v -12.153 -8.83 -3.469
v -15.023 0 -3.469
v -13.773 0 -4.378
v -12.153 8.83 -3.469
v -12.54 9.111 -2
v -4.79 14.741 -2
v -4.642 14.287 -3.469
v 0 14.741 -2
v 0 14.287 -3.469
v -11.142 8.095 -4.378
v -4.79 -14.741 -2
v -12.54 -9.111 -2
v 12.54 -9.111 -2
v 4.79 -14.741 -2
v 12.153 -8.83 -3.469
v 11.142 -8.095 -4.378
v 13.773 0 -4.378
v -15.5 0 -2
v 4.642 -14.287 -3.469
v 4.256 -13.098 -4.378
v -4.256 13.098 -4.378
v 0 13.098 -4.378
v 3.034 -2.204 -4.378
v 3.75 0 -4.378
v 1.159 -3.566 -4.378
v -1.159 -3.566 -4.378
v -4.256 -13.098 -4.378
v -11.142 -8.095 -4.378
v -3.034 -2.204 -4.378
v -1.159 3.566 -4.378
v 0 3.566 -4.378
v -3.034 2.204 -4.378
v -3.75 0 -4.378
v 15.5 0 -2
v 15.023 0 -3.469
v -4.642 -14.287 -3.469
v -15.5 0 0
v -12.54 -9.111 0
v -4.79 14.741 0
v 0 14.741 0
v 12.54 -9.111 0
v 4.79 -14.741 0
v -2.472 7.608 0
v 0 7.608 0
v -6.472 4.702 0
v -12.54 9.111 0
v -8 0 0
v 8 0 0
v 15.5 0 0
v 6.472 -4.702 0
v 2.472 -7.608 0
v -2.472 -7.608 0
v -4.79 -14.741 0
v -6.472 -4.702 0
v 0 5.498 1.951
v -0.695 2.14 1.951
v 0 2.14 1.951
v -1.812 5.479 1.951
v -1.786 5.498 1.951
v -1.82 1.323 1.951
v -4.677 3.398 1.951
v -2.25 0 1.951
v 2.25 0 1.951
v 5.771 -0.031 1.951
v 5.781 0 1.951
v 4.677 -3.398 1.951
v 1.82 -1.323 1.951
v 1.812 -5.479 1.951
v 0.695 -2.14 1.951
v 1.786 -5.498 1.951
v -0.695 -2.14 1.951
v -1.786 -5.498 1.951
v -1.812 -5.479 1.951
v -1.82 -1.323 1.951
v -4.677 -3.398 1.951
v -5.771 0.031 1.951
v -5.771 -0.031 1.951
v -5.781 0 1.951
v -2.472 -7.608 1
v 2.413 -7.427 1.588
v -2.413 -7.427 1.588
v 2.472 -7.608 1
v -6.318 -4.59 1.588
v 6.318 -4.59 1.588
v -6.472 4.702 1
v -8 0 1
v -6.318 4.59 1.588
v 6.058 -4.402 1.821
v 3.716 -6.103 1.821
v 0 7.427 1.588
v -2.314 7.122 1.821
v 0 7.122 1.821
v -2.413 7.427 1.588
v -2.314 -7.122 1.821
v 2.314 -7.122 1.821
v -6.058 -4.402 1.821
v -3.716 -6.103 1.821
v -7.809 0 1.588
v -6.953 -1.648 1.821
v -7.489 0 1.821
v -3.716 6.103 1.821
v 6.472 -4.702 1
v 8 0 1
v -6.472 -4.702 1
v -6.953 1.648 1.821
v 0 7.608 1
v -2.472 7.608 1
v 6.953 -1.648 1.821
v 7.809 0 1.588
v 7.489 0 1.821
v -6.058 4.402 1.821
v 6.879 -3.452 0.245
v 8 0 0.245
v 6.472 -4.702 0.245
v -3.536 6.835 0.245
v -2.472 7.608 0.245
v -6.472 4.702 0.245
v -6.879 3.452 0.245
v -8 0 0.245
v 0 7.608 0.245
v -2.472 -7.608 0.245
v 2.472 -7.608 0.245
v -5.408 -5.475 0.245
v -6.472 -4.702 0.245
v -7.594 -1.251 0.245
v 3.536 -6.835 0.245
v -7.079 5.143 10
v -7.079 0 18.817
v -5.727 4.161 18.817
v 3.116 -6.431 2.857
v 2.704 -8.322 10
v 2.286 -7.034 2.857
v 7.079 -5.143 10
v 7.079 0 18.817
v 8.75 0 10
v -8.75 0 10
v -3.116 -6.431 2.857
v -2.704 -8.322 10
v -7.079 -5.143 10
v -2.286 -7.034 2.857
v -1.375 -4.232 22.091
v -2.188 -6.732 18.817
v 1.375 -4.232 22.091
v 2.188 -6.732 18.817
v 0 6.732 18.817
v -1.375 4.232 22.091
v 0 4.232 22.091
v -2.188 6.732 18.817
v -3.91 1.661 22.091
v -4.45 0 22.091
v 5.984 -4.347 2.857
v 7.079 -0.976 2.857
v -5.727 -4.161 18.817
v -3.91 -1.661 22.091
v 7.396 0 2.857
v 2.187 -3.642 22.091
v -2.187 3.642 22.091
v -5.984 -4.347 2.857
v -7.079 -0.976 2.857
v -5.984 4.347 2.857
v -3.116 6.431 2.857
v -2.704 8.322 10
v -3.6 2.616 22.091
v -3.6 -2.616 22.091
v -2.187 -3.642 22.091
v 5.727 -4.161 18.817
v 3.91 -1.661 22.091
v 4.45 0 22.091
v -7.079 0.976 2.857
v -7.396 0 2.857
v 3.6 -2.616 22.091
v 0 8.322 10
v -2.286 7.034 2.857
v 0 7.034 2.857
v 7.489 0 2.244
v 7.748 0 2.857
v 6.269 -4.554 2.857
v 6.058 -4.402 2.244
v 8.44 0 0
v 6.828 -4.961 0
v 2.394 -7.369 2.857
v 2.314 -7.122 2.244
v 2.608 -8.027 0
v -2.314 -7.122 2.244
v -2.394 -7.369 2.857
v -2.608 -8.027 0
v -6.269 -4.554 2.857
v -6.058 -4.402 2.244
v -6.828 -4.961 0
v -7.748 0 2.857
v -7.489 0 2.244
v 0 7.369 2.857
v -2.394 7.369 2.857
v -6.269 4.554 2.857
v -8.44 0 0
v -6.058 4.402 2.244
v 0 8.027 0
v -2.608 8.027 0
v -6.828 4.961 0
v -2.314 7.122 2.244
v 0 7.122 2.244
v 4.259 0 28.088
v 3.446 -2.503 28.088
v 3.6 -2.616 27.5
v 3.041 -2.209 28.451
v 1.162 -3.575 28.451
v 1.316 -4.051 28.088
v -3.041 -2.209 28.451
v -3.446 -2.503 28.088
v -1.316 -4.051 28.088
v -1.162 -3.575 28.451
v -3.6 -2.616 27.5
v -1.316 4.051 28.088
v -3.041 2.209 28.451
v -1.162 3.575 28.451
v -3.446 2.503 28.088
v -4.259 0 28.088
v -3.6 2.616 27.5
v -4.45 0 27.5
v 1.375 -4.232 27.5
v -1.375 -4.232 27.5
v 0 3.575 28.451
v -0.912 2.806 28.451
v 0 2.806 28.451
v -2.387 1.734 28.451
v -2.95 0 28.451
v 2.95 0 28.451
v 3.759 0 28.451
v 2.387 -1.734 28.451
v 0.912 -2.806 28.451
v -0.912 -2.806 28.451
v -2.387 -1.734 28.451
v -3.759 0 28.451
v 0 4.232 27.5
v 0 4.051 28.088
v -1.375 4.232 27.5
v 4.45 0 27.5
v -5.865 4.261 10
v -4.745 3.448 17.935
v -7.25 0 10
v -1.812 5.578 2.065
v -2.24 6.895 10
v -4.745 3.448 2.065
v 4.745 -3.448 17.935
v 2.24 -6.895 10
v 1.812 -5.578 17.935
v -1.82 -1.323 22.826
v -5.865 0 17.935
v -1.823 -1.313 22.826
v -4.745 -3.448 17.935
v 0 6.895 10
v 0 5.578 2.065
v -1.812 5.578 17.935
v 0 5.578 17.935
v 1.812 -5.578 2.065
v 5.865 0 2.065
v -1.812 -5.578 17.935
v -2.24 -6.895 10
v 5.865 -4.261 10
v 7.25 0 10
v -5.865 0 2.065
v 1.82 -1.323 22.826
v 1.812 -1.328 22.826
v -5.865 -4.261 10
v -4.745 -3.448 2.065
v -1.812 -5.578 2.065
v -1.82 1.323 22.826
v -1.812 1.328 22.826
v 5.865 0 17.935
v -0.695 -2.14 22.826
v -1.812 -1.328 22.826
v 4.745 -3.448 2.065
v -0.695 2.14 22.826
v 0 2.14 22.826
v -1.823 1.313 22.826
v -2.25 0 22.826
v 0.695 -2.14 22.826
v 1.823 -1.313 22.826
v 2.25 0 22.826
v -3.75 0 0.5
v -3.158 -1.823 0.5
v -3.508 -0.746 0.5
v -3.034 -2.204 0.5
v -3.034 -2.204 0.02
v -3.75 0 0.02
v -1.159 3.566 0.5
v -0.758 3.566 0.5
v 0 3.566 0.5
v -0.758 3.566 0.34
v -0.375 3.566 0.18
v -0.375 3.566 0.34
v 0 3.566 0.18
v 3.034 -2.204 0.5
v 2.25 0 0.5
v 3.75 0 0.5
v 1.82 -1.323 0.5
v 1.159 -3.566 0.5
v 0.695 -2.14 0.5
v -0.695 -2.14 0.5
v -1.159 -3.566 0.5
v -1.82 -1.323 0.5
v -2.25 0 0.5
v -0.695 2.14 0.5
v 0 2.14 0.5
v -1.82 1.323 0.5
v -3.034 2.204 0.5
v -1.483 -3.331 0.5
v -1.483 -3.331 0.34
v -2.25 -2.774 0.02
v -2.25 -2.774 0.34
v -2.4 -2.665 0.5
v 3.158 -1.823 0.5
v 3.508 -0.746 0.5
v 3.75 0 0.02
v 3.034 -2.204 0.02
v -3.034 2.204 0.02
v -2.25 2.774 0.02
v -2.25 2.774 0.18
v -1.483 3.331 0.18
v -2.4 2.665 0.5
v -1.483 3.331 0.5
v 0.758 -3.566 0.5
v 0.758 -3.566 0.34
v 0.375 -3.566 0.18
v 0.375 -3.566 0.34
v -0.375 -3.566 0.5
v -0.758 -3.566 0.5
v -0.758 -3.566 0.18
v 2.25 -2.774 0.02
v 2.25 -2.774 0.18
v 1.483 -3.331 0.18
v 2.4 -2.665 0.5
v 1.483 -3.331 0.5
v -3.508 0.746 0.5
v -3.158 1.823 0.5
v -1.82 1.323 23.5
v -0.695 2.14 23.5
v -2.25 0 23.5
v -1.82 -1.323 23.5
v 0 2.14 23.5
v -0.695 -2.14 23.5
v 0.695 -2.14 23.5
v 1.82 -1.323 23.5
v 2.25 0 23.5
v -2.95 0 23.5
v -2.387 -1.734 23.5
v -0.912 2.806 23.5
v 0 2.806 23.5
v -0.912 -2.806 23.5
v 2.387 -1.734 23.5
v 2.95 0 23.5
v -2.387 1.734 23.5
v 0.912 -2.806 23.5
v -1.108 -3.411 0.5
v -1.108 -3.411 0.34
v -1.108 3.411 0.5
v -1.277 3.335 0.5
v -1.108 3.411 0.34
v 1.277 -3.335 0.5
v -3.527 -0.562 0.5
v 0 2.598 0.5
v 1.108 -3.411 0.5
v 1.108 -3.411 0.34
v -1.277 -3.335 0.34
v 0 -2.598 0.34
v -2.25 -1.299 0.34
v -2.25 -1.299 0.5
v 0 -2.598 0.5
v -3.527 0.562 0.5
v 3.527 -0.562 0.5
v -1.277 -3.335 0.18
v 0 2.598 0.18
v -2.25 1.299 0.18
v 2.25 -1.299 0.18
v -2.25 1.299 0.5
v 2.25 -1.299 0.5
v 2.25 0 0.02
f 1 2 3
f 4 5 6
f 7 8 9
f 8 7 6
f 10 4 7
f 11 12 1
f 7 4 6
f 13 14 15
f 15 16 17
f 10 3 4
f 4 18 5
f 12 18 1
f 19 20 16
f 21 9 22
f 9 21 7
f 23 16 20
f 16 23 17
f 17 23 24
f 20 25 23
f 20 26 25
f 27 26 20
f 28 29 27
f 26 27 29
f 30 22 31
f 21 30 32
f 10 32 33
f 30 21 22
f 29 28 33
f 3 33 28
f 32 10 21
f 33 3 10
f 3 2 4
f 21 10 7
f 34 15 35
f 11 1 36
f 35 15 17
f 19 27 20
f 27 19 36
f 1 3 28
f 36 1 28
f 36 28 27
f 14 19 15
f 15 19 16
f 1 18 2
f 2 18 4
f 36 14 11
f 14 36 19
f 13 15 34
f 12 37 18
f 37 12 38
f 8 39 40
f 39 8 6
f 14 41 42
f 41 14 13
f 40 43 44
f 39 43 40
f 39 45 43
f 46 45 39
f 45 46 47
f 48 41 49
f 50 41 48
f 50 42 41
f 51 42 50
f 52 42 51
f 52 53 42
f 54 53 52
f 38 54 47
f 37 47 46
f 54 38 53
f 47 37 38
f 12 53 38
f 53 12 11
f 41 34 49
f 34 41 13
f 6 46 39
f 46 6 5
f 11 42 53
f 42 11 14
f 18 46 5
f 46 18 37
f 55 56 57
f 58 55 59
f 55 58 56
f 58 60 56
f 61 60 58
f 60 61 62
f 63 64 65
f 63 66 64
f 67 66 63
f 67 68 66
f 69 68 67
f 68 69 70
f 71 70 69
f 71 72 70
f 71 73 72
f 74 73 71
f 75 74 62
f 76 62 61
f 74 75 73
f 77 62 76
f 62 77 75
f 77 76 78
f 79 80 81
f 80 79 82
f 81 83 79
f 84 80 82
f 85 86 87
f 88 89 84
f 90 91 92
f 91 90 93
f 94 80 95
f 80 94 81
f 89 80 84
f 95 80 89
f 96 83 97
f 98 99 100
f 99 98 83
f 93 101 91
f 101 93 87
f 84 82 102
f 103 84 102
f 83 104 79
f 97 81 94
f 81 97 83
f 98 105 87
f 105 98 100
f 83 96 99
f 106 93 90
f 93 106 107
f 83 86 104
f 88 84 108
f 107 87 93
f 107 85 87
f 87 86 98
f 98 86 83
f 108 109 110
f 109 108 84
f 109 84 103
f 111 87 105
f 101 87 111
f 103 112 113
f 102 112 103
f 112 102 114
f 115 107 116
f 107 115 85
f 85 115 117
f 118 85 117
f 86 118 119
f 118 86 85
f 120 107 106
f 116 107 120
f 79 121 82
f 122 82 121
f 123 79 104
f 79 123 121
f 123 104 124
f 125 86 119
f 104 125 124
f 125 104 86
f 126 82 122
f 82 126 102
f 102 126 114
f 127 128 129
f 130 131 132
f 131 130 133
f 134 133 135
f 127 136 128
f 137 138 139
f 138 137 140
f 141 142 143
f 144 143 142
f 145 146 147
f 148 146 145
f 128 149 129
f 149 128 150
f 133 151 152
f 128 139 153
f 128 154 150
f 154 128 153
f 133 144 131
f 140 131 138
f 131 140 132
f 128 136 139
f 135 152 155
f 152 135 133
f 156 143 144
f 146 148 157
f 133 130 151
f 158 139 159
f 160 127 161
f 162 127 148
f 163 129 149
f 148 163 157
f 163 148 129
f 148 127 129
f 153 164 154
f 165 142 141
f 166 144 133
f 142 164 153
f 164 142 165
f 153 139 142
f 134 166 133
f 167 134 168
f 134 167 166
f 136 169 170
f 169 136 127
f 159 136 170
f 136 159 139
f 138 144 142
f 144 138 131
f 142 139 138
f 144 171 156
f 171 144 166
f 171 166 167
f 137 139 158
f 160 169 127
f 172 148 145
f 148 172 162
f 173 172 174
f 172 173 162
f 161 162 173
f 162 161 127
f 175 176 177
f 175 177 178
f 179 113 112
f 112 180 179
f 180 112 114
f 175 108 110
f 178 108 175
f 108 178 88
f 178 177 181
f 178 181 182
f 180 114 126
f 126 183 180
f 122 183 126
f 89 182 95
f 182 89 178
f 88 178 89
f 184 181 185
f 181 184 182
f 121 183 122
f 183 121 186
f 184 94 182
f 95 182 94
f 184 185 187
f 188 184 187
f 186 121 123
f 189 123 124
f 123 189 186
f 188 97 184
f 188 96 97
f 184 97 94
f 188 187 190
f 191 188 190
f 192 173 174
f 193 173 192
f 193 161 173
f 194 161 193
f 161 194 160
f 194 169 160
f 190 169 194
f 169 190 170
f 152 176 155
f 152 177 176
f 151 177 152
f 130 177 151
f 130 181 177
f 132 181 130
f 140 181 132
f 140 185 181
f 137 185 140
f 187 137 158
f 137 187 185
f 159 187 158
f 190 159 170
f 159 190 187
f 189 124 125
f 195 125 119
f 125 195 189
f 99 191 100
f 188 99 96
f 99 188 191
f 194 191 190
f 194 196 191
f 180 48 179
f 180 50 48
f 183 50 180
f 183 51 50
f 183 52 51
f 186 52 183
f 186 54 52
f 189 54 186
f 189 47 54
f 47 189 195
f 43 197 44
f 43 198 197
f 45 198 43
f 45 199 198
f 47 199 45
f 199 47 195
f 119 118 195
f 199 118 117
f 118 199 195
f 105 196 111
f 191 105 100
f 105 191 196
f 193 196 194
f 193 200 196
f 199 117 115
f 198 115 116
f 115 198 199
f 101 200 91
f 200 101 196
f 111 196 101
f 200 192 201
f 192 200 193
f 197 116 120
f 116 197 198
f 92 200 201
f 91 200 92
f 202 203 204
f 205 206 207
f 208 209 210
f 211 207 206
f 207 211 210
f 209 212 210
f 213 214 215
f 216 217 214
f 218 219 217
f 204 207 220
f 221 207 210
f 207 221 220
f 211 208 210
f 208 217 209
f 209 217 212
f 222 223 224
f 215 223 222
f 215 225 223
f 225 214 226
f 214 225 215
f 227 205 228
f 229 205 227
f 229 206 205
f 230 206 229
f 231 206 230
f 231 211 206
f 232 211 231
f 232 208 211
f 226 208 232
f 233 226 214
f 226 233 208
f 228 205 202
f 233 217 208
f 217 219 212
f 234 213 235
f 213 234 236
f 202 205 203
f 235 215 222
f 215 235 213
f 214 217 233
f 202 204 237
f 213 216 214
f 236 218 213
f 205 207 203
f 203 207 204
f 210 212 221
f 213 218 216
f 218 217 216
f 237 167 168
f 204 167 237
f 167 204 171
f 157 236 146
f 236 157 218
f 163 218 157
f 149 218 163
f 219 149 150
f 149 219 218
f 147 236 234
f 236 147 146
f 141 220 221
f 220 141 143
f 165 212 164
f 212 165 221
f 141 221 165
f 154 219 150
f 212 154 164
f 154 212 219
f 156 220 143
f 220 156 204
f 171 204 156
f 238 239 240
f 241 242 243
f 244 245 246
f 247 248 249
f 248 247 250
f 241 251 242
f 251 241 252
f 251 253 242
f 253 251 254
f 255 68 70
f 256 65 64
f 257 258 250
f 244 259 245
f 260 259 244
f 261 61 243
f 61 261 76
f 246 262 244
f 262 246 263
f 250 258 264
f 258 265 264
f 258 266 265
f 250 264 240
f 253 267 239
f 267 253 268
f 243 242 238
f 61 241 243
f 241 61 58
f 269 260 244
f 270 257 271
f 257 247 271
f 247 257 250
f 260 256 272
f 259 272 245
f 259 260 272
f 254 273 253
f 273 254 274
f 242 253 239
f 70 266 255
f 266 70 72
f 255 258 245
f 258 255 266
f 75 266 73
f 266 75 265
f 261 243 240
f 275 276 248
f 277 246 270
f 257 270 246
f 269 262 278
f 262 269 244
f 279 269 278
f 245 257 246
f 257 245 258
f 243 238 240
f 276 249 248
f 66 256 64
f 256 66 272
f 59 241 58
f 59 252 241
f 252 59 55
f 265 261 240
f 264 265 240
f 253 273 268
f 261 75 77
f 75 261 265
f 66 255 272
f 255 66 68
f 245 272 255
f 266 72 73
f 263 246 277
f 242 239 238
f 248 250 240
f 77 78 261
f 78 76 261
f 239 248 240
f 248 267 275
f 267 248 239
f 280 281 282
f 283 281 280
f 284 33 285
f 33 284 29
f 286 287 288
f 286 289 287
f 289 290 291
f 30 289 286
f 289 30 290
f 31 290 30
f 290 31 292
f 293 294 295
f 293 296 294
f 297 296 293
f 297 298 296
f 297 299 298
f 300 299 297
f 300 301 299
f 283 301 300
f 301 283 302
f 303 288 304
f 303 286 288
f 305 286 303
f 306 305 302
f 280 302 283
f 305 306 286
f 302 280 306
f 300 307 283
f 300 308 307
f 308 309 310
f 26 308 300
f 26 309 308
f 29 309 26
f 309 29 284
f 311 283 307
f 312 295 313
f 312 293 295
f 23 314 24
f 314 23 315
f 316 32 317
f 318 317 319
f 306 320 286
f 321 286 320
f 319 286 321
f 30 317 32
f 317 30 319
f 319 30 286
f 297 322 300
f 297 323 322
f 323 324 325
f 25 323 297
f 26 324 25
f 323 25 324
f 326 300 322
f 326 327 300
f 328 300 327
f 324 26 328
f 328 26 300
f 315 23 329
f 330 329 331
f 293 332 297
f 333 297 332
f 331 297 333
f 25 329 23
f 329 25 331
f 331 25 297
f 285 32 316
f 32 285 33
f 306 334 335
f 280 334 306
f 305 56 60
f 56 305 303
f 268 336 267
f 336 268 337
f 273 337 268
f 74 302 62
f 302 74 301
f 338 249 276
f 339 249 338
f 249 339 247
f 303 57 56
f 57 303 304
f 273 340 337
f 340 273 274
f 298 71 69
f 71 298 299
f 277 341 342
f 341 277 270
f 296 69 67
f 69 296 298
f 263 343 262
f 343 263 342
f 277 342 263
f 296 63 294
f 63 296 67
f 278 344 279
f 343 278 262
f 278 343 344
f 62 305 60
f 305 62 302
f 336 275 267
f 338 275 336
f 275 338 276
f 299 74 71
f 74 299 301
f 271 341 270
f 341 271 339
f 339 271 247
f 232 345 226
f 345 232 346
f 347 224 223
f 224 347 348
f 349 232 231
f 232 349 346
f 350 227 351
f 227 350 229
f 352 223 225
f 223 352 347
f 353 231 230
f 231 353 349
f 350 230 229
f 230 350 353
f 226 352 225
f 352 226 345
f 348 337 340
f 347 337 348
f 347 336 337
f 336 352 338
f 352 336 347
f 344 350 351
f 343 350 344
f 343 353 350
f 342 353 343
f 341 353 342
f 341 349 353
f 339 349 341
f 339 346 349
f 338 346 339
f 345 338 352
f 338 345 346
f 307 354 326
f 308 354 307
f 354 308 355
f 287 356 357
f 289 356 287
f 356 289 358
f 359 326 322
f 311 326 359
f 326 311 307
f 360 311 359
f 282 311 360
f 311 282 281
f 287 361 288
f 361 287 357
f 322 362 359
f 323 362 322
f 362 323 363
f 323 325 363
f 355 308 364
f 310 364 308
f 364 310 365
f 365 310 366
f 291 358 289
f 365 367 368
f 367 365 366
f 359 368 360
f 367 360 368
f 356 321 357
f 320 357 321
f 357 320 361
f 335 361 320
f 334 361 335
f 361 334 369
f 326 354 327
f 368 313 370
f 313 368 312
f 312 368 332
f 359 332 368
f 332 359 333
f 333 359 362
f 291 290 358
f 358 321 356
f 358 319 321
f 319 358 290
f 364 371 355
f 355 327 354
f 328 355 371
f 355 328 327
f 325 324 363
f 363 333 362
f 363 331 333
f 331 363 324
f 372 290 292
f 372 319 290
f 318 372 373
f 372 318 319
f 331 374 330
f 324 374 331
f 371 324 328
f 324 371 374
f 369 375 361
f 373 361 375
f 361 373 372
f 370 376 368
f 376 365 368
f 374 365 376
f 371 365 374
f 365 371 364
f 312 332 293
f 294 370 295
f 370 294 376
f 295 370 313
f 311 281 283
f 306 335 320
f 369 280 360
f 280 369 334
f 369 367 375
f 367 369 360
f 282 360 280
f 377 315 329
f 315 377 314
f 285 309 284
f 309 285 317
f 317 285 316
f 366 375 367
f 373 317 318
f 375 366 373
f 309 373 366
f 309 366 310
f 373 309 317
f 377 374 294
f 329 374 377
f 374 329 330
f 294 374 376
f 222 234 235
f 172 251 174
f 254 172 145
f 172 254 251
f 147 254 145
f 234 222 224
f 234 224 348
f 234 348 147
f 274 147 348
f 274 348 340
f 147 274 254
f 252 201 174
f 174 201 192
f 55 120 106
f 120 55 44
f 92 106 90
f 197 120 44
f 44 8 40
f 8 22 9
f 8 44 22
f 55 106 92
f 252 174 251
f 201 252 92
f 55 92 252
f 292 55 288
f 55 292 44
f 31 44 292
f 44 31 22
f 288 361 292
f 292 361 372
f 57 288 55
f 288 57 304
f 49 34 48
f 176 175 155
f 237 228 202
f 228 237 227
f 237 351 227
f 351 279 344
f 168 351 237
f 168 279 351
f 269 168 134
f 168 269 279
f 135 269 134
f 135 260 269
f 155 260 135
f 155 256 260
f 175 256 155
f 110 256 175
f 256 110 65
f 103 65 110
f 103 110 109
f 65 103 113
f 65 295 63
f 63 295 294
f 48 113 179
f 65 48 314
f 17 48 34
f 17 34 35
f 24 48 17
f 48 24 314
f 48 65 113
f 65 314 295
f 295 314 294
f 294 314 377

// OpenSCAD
india = 17.5; // Handlebar inside diameter
outdia = 31; // Cap outside diameter
outz = 4.5; // Cap's thickness
cap_curve_r = outz - 2; // Cap curve radius

inlen = 25; // Inside overall length

minthick = 1.5; // minimum thickness

insert_dia = 5.9; // Threaded insert diameter
insert_len = 5; // Threaded insert length 
screwdia = 4.5; // Bolt shaft diameter
screw_headdia = 7.5; // Bolt head diameter
screw_headlen = 5; // Bolt head length

slot_count = 5; // Number of slots
slot_width = 40; // Width 

steps = 3;
step_h = 0.16;

$fn = 10;

difference()
{
    
all();
    translate([0,0,-50])
cube([100,100,100]);
}

module all()
{
    union()
    {
        difference()
        {
            insert_hub_z = inlen - minthick * 3;
            
            union()
            {
                // Plug end, part actually seen once installed
                rotate([0,180,0])
                    curved_cyl(dia = outdia, curve_r = cap_curve_r, h=outz);
                
                // Screw head guard for
                curved_cyl(dia = india - 1.5, curve_r = 1, h=screw_headlen -outz + minthick);
                
                extra_len = 5; // Length of the ellipsoid that gets cut to connect to the cap.
                total_egg_len = inlen + extra_len;
                
                difference()
                {
                    union()
                    {
                        // Create an ellipsoid with cut windows
                        intersection()
                        {
                            translate([0,0,total_egg_len/2 - extra_len])
                                ellipsoid(india, total_egg_len, extra_len, 1);
                            
                            for(a = [0:slot_count - 1])
                            {
                                rotate([0,0,360 / slot_count * a])
                                {
                                    translate([0,-slot_width/2,0])
                                        cube([india, slot_width, inlen]);
                                }
                            }
                        }
                        
                        // Add the tip for the threaded insert
                        translate([0,0,insert_hub_z])
                            curved_cyl(insert_dia + minthick * 2, 1, insert_len + minthick * 2);
                        
                    }
                    
                    // Carve the inside of the ellipsoid
                    translate([0,0,total_egg_len/2 - extra_len])
                         ellipsoid(india - minthick * 2, total_egg_len - minthick * 2, 0, 0);
                }
                
            }

            // Insert slot
            translate([0,0,insert_hub_z + minthick * 2])
                cylinder(d = insert_dia, h=insert_len);
            
            // Bolt
            translate([0,0,-outz])
                screw(screw_headdia, screw_headlen, screwdia, inlen +  15);
        }
    
        // Helps the printer printing bridges around the hole for the bolt.
        translate([0,0,-outz + screw_headlen])
            for(x = [0:steps])
            {
                rotate([0,0,180/steps*x])
                translate([0,0,-step_h *x])
                    cyl_inter(screw_headdia, screwdia, step_h*x);
            }
    
    }
}

// Cylinder intersected with a cube, creating round ramps for layers
module cyl_inter(dia, width, h)
{
    difference()
    {
        cylinder(d=dia, h=h);
        translate([-width/2,-dia/2,0])
            cube([width, dia, h]);
    }
}

module screw(headdia, headlen, shaftdia, shaftlen)
{
    union()
    {
        cylinder(d=headdia,h=headlen);
        cylinder(d=shaftdia,h=shaftlen);
    }
}

module ellipsoid(dia, length, skirt_pos, skirt_r)
{    
    ratio = length / dia;
    
    // skirt position on the original round sphere, before transformation
    skirt_zpos = dia/2 - skirt_pos / ratio;
    angle = 90 - acos(skirt_zpos * 2 / dia);
    skirt_dia = 2* sqrt(pow(dia/2, 2) - pow(skirt_zpos, 2));
    skirt_dia2 = 2* sqrt(pow(dia/2, 2) - pow(skirt_zpos - filet_h(skirt_dia, skirt_r, angle), 2));
    
    scale([1, 1, ratio]) 
    {
        union()
        {
            sphere(d=dia);
            translate([0,0,-skirt_zpos])
                filet(skirt_dia2, skirt_r, angle);
        }
    }
}

function filet_h(dia, curve_r, angle) =  curve_r + sin(angle) * curve_r;

module filet(dia, curve_r, angle)
{
    circle_h = filet_h(dia, curve_r, angle);
    y_offset = cos(angle) * curve_r;
    
    rotate_extrude()
    rotate([0,0,-90])
    difference()
    {
        translate([-circle_h, -dia/2 - y_offset,0])
             square([circle_h, dia/2 + y_offset]);
        
        translate([-curve_r, -dia/2 - y_offset, 0])
            intersection()
            {
                circle(r=curve_r);
                translate([-circle_h + curve_r, 0, 0])
                    square([curve_r * 2, curve_r]);
            }
    }
}

// Cylinder with a rounded edge.
module curved_cyl(dia, curve_r, h)
{
    translate([0,0,h-curve_r])
    rotate([0,180,0])
    union()
    {
        difference()
        {
            hull()
            {
                rotate_extrude(angle = 360) 
                {
                    translate([dia/2 - curve_r,0,0])
                        circle(d=curve_r * 2);
                }
            }
            
            cylinder(d=dia, h=curve_r);
        }
        cylinder(d=dia, h=h-curve_r);
    }
}
